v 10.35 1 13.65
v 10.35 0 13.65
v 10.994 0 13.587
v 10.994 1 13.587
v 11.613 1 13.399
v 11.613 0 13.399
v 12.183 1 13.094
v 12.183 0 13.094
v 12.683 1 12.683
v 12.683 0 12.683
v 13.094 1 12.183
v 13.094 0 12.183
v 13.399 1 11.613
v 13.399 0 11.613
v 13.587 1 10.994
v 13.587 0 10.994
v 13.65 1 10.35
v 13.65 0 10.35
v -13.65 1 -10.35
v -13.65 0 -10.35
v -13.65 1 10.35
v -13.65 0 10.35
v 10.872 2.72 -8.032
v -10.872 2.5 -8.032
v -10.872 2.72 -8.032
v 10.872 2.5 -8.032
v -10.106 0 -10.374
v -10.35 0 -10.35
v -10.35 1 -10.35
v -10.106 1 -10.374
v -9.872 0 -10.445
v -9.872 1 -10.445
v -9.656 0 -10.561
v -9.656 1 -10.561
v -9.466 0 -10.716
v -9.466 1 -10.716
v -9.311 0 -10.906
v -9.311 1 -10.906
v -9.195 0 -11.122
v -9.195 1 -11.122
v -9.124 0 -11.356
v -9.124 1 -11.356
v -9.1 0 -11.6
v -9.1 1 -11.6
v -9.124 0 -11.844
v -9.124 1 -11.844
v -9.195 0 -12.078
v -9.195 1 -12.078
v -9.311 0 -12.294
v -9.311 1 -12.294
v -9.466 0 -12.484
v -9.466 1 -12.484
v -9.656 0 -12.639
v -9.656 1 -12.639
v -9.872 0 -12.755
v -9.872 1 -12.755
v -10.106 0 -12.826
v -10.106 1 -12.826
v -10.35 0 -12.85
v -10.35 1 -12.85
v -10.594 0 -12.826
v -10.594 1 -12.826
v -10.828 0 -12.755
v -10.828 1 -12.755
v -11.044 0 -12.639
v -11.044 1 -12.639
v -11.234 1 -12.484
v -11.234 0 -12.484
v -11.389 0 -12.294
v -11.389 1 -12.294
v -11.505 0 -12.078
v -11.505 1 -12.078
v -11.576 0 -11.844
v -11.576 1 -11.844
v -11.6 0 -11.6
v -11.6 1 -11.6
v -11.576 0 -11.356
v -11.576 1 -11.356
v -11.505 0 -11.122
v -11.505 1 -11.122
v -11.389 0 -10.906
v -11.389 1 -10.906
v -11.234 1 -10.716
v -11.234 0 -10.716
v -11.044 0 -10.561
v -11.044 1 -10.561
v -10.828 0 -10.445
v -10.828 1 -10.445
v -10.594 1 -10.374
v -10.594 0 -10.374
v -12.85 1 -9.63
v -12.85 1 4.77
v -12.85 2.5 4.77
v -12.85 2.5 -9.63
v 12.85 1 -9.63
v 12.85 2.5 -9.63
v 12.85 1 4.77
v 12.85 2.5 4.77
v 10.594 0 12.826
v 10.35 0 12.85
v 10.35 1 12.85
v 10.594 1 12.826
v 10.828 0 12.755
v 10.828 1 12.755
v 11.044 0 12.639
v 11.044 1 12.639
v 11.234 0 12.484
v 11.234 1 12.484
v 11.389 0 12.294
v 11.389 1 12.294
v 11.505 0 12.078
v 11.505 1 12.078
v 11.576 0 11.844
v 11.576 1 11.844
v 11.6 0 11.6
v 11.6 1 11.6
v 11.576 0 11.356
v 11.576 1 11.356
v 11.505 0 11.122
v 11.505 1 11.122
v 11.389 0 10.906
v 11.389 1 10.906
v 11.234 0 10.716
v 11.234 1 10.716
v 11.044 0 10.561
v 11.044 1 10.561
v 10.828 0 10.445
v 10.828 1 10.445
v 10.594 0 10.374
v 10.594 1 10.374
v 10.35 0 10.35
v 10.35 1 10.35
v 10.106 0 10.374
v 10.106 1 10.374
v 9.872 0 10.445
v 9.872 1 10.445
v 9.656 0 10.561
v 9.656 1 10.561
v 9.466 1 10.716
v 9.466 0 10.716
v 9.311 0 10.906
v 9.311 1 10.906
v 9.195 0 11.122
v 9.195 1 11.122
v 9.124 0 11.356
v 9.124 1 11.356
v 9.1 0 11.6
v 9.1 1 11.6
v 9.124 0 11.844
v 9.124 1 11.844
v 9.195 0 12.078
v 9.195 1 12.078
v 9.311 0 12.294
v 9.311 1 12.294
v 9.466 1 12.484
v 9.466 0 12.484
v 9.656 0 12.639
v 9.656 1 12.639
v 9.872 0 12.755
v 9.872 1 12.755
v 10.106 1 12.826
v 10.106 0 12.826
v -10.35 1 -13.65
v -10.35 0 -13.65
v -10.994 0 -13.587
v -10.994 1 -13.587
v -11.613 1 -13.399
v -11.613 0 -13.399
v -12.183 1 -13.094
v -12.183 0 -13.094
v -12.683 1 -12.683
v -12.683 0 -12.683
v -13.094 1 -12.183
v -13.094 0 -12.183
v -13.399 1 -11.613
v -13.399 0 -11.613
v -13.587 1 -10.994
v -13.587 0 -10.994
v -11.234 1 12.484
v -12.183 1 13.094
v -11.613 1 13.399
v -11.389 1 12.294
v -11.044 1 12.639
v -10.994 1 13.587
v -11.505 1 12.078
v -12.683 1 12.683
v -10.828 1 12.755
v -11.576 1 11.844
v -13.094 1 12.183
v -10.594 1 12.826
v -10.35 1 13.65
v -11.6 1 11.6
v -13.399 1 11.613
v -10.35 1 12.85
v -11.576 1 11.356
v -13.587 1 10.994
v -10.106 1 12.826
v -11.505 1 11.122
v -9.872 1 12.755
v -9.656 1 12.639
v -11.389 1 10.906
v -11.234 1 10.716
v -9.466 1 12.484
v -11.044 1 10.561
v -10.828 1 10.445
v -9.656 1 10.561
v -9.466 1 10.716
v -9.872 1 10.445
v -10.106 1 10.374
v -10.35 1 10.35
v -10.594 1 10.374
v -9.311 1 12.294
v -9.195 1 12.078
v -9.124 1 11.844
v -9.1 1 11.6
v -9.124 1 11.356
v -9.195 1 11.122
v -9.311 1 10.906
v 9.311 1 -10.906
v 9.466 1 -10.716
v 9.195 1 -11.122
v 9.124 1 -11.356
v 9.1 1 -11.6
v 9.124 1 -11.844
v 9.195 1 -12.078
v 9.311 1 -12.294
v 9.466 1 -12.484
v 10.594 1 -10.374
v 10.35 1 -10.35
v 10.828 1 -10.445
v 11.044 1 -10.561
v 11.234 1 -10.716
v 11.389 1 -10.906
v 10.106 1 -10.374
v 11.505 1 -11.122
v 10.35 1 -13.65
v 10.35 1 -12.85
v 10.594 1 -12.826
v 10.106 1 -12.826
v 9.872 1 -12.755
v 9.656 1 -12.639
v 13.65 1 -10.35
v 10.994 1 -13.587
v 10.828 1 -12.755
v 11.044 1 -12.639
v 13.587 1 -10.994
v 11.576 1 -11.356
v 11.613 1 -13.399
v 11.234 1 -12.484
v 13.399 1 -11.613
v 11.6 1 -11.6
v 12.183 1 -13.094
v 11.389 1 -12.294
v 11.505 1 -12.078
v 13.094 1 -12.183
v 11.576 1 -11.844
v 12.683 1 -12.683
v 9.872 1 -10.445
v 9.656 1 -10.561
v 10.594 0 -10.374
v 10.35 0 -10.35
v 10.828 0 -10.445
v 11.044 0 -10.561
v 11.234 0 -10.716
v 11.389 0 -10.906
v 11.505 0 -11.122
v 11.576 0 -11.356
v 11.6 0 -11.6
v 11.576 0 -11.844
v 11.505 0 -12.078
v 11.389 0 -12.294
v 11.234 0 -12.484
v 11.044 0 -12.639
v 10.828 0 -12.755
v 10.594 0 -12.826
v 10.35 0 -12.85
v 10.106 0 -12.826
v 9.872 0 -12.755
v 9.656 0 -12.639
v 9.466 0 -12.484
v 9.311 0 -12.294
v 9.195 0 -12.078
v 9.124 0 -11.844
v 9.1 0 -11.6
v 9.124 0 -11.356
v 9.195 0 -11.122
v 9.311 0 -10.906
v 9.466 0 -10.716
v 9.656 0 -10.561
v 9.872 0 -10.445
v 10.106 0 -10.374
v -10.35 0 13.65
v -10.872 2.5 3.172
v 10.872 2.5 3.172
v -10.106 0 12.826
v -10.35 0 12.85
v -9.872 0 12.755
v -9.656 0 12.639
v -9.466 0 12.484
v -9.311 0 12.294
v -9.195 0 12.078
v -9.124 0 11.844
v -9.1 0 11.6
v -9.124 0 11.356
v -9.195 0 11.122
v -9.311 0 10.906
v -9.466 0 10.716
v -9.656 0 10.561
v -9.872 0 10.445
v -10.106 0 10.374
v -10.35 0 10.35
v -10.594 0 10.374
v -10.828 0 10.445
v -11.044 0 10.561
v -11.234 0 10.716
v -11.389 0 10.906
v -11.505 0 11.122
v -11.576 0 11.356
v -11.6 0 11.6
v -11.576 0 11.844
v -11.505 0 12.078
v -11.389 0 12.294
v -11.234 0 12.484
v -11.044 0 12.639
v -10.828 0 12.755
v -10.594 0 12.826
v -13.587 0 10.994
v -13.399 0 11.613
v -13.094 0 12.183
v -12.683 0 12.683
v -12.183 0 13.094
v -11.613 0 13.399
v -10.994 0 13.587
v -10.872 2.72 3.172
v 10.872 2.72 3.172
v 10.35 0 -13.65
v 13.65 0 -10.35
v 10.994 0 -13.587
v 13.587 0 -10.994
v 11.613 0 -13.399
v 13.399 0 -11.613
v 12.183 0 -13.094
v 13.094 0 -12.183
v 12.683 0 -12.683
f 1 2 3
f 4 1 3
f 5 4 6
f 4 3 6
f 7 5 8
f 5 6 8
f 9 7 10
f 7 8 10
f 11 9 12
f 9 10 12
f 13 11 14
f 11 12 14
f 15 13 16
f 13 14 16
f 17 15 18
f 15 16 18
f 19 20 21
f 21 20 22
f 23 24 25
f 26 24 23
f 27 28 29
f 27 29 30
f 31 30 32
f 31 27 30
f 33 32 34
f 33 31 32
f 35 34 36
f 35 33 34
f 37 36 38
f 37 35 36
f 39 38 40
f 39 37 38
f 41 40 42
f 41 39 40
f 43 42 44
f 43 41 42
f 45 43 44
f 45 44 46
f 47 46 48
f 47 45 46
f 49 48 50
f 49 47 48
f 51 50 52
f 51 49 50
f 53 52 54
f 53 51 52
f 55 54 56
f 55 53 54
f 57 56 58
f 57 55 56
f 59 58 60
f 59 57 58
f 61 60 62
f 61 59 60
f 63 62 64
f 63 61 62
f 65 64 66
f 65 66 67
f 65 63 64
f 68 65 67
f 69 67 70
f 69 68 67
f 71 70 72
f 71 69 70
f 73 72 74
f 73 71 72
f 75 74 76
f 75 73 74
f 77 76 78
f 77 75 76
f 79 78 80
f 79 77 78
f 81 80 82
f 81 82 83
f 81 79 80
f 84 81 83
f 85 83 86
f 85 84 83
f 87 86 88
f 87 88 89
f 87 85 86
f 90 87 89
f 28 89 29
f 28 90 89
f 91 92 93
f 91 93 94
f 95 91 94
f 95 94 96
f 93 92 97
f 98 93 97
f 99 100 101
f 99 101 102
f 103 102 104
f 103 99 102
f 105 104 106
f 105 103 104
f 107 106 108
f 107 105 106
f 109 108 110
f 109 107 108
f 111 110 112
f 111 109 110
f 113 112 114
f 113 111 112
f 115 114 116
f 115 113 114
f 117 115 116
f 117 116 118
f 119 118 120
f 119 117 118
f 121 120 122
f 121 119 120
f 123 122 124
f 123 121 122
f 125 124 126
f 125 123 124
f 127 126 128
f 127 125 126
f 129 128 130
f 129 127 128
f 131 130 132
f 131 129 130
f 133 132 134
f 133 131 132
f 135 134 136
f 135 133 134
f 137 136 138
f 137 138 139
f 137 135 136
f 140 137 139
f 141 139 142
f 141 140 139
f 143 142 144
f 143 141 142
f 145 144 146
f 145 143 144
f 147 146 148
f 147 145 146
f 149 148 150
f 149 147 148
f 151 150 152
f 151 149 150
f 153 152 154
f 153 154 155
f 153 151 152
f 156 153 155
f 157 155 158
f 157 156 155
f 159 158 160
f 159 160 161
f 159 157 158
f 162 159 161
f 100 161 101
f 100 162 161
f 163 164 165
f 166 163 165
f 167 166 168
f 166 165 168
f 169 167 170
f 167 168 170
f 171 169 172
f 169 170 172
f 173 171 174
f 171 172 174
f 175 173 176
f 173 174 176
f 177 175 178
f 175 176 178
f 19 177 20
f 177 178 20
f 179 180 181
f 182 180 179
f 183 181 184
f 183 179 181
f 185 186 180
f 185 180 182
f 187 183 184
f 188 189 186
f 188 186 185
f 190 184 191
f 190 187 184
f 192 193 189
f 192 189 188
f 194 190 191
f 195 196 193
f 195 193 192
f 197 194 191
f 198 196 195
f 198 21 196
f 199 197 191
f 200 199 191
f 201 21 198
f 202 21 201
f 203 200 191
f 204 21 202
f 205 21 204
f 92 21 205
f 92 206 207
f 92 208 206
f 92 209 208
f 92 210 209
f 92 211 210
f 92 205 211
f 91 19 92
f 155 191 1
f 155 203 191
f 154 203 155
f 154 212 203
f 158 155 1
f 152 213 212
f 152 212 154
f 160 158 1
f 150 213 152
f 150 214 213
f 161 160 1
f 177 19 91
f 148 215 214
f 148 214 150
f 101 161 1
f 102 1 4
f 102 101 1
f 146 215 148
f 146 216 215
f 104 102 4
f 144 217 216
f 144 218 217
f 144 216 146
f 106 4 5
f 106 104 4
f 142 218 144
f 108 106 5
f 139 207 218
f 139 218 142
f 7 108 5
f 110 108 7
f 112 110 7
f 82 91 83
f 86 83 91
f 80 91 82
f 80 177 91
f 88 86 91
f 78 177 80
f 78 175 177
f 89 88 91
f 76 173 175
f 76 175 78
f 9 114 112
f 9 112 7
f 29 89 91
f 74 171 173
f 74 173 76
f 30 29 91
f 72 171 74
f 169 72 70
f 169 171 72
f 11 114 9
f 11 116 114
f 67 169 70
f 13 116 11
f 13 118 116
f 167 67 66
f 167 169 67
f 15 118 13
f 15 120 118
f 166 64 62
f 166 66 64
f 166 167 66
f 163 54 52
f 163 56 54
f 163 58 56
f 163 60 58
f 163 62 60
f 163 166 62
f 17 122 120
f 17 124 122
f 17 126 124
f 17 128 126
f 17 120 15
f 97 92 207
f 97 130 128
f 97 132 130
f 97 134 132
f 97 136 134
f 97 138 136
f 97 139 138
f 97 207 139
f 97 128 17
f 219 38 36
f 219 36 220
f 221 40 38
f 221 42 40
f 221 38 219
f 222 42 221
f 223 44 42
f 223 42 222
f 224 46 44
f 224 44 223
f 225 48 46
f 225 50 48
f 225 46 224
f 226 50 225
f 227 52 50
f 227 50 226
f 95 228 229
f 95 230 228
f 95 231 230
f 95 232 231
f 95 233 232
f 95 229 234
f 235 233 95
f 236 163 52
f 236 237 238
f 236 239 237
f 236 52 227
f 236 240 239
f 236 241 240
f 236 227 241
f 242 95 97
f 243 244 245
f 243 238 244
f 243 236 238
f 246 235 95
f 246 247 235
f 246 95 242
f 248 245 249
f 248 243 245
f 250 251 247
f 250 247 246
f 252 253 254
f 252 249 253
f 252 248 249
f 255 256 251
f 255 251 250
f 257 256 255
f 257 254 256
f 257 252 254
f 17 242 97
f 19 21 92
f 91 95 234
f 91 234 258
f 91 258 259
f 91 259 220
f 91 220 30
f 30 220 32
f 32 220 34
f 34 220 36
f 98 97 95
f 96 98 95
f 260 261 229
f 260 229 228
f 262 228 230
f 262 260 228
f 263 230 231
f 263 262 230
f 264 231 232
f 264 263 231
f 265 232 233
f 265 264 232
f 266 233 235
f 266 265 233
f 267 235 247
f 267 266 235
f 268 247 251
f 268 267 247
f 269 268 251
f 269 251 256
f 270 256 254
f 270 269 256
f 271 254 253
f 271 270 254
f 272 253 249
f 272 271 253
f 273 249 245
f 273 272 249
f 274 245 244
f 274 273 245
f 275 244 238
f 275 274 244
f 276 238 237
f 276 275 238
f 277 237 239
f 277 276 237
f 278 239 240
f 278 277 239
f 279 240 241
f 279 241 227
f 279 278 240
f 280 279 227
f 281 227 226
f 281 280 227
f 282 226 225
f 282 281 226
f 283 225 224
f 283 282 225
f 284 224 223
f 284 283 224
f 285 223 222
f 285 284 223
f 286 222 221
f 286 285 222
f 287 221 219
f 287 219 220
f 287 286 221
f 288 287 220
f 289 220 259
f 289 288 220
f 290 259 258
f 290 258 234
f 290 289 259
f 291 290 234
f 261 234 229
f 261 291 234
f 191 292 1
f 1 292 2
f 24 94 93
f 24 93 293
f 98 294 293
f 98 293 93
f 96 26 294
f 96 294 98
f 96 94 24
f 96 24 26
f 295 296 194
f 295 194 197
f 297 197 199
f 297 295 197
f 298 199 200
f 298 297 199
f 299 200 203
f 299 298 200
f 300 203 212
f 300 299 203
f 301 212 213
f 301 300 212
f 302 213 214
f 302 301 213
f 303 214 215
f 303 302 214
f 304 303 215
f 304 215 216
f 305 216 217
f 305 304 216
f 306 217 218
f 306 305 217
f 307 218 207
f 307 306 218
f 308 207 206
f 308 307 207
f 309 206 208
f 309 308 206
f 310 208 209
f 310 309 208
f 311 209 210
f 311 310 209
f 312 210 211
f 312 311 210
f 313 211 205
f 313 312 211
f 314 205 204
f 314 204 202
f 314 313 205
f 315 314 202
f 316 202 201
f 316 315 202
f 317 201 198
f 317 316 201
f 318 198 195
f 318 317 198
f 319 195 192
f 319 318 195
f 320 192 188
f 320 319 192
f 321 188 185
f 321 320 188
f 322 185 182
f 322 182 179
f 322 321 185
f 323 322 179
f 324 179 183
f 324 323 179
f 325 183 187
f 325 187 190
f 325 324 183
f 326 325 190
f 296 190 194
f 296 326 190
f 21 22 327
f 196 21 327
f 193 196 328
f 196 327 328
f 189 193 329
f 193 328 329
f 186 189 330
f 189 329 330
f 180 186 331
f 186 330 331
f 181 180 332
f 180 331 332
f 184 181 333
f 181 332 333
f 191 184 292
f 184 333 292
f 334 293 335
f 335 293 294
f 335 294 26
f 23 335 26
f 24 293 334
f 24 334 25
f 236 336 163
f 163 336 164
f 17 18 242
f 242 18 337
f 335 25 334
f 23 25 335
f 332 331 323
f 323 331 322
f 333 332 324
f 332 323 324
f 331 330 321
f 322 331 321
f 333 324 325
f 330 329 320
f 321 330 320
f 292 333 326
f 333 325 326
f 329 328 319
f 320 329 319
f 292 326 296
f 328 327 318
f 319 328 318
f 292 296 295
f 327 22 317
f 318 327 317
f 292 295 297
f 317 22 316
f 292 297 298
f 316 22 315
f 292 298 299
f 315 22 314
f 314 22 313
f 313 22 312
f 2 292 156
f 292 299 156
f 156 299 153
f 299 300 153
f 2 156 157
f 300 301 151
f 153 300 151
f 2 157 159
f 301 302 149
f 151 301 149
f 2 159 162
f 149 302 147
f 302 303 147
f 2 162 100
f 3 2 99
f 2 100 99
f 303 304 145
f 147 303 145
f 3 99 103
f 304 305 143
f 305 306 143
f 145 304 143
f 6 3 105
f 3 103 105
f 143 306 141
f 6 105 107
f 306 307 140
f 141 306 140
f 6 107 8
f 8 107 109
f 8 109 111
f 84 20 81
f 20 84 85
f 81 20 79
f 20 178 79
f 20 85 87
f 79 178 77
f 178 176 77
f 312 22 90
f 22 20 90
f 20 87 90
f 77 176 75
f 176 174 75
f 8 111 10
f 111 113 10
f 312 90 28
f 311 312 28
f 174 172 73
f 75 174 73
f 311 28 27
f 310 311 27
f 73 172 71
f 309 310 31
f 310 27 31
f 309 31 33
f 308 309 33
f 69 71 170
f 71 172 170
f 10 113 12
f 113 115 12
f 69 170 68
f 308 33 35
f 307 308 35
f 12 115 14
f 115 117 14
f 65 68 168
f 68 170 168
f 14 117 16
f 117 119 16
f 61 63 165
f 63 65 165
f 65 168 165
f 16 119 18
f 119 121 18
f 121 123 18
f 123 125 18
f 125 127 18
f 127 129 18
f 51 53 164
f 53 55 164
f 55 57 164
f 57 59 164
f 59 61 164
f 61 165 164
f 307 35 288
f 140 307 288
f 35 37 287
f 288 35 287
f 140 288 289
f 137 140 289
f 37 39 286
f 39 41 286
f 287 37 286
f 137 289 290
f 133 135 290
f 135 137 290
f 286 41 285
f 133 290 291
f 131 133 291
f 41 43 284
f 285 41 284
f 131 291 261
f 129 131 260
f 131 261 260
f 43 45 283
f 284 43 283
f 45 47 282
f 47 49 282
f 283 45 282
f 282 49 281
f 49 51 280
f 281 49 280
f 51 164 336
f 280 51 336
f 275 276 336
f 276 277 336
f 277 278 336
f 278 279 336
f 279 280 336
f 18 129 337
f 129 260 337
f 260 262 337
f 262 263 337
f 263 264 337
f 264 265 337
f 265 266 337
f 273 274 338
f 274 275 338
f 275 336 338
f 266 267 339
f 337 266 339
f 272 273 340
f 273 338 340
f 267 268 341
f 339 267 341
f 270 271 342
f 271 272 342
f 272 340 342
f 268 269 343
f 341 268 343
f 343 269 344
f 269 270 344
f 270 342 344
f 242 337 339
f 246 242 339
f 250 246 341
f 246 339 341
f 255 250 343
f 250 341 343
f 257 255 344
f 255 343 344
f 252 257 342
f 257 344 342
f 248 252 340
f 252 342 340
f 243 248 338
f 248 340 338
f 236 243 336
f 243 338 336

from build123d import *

# Parameters (mm, degrees)
SKETCH1_R           = 1.25
BOSS_EXTRUDE1_DEPTH = 1
SKETCH2_W           = 25.7
SKETCH2_H           = 14.4
BOSS_EXTRUDE2_DEPTH = 1.5
SKETCH4_W           = 21.744
SKETCH4_H           = 11.204
BOSS_EXTRUDE3_DEPTH = 0.22


with BuildPart() as part:
    # Sketch1 → Boss-Extrude1 (new body)
    with BuildSketch(Plane(origin=(0, 0, 0), x_dir=(1, 0, 0), z_dir=(0, 1, 0))):
        with BuildLine():
            Line((-10.35, -13.65), (10.35, -13.65))
            ThreePointArc((10.35, -13.65), (12.683452378, -12.683452378), (13.65, -10.35))
            Line((13.65, -10.35), (13.65, 10.35))
            ThreePointArc((13.65, 10.35), (12.683452378, 12.683452378), (10.35, 13.65))
            Line((10.35, 13.65), (-10.35, 13.65))
            ThreePointArc((-10.35, 13.65), (-12.683452378, 12.683452378), (-13.65, 10.35))
            Line((-13.65, 10.35), (-13.65, -10.35))
            ThreePointArc((-13.65, -10.35), (-12.683452378, -12.683452378), (-10.35, -13.65))
        make_face()
        with Locations(Location((-10.35, 11.6, 0), (0, 0, 270))):
            Circle(SKETCH1_R, mode=Mode.SUBTRACT)
        with Locations(Location((10.35, 11.6, 0), (0, 0, 270))):
            Circle(SKETCH1_R, mode=Mode.SUBTRACT)
        with Locations(Location((10.35, -11.6, 0), (0, 0, 270))):
            Circle(SKETCH1_R, mode=Mode.SUBTRACT)
        with Locations(Location((-10.35, -11.6, 0), (0, 0, 270))):
            Circle(SKETCH1_R, mode=Mode.SUBTRACT)
    extrude(amount=BOSS_EXTRUDE1_DEPTH)

    # Sketch2 → Boss-Extrude2 (add)
    with BuildSketch(Plane(origin=(0, 1, 0), x_dir=(1, 0, 0), z_dir=(0, 1, 0))):
        with Locations((0, 2.43)):
            Rectangle(SKETCH2_W, SKETCH2_H)
    extrude(amount=BOSS_EXTRUDE2_DEPTH)

    # Sketch4 → Boss-Extrude3 (add)
    with BuildSketch(Plane(origin=(0, 2.5, 0), x_dir=(1, 0, 0), z_dir=(0, 1, 0))):
        with Locations((0, 2.43)):
            Rectangle(SKETCH4_W, SKETCH4_H)
    extrude(amount=BOSS_EXTRUDE3_DEPTH)


solid = part.part
